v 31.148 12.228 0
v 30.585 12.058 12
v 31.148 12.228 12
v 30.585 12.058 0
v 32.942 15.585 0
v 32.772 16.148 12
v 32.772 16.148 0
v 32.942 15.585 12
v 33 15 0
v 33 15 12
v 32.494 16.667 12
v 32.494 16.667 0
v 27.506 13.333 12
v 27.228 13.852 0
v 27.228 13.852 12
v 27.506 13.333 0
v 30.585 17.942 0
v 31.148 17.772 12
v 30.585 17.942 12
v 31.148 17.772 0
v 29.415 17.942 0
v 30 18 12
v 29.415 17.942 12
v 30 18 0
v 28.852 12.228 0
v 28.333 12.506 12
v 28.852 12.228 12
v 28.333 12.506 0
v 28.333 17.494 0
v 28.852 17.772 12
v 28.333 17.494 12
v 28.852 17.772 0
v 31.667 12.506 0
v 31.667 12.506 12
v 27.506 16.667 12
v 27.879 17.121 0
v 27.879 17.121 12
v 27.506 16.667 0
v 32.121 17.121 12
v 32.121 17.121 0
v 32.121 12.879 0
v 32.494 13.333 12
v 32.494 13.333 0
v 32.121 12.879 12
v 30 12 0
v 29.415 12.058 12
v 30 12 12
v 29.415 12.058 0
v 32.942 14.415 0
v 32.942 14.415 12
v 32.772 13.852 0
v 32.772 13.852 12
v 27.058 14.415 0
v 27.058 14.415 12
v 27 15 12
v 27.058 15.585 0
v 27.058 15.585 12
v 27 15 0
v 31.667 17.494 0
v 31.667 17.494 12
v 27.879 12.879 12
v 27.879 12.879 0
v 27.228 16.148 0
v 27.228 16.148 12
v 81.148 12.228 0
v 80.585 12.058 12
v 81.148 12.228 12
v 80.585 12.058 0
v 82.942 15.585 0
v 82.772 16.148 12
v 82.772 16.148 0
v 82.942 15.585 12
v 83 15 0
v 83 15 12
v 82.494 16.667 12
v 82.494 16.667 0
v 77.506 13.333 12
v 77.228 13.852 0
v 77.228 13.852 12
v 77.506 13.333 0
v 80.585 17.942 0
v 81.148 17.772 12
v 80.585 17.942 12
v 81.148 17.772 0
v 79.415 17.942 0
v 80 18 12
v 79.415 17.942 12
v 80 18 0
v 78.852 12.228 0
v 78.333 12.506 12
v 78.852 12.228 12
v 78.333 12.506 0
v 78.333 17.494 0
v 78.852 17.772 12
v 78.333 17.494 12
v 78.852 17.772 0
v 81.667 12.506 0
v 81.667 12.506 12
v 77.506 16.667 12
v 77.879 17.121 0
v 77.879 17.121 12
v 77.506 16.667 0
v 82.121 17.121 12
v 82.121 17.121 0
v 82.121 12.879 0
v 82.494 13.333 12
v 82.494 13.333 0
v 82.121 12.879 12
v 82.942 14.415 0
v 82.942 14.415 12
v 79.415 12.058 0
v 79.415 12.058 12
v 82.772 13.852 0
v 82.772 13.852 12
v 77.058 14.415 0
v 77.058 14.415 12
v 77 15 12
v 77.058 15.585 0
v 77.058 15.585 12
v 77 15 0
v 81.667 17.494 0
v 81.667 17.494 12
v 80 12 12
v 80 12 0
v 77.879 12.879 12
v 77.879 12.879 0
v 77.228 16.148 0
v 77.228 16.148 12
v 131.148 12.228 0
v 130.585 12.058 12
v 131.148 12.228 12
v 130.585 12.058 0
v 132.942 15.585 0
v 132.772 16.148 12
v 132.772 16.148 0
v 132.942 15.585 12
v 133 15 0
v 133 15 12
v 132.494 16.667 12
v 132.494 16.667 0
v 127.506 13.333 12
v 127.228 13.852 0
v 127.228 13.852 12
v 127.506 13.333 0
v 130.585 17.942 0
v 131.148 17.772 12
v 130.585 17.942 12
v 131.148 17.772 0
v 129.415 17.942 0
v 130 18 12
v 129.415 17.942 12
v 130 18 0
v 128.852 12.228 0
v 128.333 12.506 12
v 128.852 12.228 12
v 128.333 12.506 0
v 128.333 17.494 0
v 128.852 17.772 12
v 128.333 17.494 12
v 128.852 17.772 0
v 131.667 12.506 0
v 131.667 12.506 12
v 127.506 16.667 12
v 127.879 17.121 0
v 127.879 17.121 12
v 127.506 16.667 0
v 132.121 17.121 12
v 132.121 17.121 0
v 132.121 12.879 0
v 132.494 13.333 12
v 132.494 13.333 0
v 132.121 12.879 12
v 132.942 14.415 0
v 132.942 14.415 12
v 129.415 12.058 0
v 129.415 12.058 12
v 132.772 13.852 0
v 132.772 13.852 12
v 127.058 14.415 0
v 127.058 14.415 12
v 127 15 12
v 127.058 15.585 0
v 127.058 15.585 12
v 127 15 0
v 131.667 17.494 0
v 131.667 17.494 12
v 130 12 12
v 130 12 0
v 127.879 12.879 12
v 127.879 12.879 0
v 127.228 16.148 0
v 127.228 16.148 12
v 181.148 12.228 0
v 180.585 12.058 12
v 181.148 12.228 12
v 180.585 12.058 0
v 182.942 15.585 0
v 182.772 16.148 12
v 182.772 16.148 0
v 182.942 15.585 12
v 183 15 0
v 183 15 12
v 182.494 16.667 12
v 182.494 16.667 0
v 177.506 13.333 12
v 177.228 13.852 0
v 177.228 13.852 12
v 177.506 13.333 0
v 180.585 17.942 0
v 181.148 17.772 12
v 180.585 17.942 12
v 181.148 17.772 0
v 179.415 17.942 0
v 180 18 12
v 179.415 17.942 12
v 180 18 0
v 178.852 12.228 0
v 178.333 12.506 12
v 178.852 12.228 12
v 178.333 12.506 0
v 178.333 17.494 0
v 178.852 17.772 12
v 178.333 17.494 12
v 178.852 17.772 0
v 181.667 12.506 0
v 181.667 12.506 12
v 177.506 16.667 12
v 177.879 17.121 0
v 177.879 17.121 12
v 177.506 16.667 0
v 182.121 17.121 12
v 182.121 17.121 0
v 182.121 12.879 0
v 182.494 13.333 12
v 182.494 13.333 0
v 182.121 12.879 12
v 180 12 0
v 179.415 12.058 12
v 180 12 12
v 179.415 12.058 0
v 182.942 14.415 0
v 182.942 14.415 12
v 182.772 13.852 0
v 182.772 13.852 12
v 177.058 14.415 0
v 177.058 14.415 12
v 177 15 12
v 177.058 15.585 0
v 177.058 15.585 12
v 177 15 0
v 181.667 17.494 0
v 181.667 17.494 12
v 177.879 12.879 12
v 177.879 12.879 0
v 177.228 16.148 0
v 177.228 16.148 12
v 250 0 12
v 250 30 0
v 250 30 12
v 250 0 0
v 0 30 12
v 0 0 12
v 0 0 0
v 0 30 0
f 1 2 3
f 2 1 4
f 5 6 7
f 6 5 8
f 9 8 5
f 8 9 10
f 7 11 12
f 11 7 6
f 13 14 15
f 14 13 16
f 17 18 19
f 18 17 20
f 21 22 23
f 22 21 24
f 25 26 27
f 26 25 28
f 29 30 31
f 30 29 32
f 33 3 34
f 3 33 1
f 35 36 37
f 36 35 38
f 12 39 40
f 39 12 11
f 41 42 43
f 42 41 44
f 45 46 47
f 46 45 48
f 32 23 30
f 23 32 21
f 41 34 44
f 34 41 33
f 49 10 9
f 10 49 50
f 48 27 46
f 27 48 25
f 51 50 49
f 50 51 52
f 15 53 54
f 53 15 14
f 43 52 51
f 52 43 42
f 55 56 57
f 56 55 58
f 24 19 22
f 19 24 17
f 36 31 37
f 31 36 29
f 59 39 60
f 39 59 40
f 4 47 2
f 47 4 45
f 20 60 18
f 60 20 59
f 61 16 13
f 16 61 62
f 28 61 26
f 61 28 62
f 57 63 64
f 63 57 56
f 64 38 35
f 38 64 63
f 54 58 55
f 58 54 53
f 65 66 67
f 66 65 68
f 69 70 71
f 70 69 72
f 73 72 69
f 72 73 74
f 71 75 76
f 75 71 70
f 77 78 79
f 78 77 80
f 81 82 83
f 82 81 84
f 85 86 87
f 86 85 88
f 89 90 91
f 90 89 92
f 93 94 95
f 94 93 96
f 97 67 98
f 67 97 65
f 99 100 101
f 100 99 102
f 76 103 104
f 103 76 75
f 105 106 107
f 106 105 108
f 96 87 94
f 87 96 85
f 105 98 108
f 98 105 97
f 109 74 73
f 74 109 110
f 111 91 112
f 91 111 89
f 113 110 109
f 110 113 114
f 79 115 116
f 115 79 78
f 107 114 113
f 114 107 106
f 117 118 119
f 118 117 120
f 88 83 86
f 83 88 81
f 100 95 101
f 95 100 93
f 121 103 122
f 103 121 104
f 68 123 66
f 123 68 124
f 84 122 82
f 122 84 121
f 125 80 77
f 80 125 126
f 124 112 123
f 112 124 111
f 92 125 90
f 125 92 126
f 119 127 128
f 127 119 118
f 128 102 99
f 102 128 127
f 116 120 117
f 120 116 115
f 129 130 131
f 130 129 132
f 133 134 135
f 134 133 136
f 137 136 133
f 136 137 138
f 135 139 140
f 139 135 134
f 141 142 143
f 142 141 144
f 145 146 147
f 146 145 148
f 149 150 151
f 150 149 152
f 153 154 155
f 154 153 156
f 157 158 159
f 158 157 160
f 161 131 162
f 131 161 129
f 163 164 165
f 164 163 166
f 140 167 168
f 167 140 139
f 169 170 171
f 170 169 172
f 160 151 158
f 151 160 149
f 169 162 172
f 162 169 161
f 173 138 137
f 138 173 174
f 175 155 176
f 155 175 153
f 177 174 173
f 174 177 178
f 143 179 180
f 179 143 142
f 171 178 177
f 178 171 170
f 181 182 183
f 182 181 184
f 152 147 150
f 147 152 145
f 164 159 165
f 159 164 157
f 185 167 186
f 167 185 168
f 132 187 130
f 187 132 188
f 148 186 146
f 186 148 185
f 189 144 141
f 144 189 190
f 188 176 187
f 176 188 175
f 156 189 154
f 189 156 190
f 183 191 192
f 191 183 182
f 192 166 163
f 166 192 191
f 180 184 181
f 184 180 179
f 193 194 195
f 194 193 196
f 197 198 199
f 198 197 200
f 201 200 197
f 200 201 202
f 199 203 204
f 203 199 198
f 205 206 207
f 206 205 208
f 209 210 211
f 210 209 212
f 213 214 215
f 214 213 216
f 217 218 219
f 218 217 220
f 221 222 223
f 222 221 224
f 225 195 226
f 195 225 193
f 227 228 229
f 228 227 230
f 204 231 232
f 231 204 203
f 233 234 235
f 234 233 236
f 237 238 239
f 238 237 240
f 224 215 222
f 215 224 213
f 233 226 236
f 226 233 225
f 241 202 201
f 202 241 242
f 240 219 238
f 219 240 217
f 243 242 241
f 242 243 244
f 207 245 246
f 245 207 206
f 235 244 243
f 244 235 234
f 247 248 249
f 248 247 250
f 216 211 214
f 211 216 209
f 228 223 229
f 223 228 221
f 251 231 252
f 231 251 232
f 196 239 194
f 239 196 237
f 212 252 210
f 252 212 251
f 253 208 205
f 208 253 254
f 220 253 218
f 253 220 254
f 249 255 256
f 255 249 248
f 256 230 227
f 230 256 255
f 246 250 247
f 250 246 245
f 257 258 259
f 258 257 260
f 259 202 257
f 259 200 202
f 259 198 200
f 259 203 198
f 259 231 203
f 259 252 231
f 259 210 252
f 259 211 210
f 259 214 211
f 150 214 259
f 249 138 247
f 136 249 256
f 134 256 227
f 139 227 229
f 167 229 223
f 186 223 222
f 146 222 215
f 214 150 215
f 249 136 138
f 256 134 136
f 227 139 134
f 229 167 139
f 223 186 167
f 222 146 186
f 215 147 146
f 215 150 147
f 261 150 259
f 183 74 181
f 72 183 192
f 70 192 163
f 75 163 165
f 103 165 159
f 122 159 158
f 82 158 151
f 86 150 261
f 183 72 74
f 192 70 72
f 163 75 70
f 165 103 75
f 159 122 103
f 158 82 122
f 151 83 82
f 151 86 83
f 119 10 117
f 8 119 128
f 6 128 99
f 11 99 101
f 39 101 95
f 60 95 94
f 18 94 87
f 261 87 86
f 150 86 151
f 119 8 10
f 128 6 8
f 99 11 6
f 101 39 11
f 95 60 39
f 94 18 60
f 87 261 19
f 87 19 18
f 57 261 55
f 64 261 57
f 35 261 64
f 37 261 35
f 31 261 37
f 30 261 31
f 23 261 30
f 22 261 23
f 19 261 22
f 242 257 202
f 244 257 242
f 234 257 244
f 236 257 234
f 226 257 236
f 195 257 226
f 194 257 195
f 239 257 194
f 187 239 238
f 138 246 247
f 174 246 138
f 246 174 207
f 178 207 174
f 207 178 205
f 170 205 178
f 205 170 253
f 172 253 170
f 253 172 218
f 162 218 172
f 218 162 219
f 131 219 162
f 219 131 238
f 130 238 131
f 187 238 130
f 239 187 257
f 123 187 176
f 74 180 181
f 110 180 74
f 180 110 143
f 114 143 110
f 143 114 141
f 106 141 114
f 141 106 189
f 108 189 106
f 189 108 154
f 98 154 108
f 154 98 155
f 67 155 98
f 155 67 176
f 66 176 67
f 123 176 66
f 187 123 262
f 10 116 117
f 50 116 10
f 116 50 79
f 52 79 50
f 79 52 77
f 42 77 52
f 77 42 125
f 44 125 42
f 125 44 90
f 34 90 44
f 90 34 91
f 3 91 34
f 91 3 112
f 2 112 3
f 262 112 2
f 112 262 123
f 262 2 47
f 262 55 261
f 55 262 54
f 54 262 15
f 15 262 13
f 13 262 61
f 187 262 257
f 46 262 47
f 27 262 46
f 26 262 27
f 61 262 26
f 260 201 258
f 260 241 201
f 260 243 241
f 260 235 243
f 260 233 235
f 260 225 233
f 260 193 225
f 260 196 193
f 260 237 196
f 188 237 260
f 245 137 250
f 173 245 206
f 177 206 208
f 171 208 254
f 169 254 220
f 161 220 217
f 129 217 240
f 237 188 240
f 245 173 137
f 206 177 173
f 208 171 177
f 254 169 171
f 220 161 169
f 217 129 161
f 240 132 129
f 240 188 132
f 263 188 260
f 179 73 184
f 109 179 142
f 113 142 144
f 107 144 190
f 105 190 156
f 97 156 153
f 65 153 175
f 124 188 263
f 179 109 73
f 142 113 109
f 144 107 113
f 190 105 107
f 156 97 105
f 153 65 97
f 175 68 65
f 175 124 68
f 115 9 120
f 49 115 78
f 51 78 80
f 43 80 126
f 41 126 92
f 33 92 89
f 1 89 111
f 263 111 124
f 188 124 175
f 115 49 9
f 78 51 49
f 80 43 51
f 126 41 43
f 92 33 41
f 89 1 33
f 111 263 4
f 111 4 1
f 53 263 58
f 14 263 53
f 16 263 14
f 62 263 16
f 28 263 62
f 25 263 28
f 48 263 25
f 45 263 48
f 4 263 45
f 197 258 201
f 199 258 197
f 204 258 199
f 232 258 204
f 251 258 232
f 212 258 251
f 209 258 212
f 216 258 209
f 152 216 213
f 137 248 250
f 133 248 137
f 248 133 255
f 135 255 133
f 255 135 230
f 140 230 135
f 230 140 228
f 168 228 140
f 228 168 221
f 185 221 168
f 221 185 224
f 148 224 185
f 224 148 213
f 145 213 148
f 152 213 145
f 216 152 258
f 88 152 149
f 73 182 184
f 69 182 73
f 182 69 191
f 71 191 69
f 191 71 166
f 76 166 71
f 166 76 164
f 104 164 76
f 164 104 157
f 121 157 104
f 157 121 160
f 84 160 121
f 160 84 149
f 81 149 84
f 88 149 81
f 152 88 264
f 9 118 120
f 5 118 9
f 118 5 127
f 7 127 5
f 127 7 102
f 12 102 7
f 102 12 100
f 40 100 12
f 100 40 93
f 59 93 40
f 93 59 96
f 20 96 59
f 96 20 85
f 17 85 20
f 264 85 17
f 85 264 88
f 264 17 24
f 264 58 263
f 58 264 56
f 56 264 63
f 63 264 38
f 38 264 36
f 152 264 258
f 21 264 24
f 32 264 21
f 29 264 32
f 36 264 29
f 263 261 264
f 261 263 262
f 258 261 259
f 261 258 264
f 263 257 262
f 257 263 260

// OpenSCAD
$fn = 32;

// ----------------------------------------------------------------------
// Long rail: 200-250 mm mounting rail
// ----------------------------------------------------------------------

// --- parameters (mm) ---
rail_l = 250;             // rail length, X
rail_w = 30;              // rail width, Y
rail_t = 12;              // rail thickness, Z
hole_d = 6;               // mounting hole diameter
hole_start = 30;          // first hole offset from the end
hole_pitch = 50;          // hole pitch
holes = 4;                // number of holes
fit_tol = 0.05;           // tolerance for press fits, mm
free_tol = 0.3;           // tolerance for clearance fits, mm

difference() {
  cube([rail_l, rail_w, rail_t]);
  for (i = [0 : holes - 1])
    translate([hole_start + i * hole_pitch, rail_w / 2, -1])
      cylinder(h = rail_t + 2, d = hole_d);
}
